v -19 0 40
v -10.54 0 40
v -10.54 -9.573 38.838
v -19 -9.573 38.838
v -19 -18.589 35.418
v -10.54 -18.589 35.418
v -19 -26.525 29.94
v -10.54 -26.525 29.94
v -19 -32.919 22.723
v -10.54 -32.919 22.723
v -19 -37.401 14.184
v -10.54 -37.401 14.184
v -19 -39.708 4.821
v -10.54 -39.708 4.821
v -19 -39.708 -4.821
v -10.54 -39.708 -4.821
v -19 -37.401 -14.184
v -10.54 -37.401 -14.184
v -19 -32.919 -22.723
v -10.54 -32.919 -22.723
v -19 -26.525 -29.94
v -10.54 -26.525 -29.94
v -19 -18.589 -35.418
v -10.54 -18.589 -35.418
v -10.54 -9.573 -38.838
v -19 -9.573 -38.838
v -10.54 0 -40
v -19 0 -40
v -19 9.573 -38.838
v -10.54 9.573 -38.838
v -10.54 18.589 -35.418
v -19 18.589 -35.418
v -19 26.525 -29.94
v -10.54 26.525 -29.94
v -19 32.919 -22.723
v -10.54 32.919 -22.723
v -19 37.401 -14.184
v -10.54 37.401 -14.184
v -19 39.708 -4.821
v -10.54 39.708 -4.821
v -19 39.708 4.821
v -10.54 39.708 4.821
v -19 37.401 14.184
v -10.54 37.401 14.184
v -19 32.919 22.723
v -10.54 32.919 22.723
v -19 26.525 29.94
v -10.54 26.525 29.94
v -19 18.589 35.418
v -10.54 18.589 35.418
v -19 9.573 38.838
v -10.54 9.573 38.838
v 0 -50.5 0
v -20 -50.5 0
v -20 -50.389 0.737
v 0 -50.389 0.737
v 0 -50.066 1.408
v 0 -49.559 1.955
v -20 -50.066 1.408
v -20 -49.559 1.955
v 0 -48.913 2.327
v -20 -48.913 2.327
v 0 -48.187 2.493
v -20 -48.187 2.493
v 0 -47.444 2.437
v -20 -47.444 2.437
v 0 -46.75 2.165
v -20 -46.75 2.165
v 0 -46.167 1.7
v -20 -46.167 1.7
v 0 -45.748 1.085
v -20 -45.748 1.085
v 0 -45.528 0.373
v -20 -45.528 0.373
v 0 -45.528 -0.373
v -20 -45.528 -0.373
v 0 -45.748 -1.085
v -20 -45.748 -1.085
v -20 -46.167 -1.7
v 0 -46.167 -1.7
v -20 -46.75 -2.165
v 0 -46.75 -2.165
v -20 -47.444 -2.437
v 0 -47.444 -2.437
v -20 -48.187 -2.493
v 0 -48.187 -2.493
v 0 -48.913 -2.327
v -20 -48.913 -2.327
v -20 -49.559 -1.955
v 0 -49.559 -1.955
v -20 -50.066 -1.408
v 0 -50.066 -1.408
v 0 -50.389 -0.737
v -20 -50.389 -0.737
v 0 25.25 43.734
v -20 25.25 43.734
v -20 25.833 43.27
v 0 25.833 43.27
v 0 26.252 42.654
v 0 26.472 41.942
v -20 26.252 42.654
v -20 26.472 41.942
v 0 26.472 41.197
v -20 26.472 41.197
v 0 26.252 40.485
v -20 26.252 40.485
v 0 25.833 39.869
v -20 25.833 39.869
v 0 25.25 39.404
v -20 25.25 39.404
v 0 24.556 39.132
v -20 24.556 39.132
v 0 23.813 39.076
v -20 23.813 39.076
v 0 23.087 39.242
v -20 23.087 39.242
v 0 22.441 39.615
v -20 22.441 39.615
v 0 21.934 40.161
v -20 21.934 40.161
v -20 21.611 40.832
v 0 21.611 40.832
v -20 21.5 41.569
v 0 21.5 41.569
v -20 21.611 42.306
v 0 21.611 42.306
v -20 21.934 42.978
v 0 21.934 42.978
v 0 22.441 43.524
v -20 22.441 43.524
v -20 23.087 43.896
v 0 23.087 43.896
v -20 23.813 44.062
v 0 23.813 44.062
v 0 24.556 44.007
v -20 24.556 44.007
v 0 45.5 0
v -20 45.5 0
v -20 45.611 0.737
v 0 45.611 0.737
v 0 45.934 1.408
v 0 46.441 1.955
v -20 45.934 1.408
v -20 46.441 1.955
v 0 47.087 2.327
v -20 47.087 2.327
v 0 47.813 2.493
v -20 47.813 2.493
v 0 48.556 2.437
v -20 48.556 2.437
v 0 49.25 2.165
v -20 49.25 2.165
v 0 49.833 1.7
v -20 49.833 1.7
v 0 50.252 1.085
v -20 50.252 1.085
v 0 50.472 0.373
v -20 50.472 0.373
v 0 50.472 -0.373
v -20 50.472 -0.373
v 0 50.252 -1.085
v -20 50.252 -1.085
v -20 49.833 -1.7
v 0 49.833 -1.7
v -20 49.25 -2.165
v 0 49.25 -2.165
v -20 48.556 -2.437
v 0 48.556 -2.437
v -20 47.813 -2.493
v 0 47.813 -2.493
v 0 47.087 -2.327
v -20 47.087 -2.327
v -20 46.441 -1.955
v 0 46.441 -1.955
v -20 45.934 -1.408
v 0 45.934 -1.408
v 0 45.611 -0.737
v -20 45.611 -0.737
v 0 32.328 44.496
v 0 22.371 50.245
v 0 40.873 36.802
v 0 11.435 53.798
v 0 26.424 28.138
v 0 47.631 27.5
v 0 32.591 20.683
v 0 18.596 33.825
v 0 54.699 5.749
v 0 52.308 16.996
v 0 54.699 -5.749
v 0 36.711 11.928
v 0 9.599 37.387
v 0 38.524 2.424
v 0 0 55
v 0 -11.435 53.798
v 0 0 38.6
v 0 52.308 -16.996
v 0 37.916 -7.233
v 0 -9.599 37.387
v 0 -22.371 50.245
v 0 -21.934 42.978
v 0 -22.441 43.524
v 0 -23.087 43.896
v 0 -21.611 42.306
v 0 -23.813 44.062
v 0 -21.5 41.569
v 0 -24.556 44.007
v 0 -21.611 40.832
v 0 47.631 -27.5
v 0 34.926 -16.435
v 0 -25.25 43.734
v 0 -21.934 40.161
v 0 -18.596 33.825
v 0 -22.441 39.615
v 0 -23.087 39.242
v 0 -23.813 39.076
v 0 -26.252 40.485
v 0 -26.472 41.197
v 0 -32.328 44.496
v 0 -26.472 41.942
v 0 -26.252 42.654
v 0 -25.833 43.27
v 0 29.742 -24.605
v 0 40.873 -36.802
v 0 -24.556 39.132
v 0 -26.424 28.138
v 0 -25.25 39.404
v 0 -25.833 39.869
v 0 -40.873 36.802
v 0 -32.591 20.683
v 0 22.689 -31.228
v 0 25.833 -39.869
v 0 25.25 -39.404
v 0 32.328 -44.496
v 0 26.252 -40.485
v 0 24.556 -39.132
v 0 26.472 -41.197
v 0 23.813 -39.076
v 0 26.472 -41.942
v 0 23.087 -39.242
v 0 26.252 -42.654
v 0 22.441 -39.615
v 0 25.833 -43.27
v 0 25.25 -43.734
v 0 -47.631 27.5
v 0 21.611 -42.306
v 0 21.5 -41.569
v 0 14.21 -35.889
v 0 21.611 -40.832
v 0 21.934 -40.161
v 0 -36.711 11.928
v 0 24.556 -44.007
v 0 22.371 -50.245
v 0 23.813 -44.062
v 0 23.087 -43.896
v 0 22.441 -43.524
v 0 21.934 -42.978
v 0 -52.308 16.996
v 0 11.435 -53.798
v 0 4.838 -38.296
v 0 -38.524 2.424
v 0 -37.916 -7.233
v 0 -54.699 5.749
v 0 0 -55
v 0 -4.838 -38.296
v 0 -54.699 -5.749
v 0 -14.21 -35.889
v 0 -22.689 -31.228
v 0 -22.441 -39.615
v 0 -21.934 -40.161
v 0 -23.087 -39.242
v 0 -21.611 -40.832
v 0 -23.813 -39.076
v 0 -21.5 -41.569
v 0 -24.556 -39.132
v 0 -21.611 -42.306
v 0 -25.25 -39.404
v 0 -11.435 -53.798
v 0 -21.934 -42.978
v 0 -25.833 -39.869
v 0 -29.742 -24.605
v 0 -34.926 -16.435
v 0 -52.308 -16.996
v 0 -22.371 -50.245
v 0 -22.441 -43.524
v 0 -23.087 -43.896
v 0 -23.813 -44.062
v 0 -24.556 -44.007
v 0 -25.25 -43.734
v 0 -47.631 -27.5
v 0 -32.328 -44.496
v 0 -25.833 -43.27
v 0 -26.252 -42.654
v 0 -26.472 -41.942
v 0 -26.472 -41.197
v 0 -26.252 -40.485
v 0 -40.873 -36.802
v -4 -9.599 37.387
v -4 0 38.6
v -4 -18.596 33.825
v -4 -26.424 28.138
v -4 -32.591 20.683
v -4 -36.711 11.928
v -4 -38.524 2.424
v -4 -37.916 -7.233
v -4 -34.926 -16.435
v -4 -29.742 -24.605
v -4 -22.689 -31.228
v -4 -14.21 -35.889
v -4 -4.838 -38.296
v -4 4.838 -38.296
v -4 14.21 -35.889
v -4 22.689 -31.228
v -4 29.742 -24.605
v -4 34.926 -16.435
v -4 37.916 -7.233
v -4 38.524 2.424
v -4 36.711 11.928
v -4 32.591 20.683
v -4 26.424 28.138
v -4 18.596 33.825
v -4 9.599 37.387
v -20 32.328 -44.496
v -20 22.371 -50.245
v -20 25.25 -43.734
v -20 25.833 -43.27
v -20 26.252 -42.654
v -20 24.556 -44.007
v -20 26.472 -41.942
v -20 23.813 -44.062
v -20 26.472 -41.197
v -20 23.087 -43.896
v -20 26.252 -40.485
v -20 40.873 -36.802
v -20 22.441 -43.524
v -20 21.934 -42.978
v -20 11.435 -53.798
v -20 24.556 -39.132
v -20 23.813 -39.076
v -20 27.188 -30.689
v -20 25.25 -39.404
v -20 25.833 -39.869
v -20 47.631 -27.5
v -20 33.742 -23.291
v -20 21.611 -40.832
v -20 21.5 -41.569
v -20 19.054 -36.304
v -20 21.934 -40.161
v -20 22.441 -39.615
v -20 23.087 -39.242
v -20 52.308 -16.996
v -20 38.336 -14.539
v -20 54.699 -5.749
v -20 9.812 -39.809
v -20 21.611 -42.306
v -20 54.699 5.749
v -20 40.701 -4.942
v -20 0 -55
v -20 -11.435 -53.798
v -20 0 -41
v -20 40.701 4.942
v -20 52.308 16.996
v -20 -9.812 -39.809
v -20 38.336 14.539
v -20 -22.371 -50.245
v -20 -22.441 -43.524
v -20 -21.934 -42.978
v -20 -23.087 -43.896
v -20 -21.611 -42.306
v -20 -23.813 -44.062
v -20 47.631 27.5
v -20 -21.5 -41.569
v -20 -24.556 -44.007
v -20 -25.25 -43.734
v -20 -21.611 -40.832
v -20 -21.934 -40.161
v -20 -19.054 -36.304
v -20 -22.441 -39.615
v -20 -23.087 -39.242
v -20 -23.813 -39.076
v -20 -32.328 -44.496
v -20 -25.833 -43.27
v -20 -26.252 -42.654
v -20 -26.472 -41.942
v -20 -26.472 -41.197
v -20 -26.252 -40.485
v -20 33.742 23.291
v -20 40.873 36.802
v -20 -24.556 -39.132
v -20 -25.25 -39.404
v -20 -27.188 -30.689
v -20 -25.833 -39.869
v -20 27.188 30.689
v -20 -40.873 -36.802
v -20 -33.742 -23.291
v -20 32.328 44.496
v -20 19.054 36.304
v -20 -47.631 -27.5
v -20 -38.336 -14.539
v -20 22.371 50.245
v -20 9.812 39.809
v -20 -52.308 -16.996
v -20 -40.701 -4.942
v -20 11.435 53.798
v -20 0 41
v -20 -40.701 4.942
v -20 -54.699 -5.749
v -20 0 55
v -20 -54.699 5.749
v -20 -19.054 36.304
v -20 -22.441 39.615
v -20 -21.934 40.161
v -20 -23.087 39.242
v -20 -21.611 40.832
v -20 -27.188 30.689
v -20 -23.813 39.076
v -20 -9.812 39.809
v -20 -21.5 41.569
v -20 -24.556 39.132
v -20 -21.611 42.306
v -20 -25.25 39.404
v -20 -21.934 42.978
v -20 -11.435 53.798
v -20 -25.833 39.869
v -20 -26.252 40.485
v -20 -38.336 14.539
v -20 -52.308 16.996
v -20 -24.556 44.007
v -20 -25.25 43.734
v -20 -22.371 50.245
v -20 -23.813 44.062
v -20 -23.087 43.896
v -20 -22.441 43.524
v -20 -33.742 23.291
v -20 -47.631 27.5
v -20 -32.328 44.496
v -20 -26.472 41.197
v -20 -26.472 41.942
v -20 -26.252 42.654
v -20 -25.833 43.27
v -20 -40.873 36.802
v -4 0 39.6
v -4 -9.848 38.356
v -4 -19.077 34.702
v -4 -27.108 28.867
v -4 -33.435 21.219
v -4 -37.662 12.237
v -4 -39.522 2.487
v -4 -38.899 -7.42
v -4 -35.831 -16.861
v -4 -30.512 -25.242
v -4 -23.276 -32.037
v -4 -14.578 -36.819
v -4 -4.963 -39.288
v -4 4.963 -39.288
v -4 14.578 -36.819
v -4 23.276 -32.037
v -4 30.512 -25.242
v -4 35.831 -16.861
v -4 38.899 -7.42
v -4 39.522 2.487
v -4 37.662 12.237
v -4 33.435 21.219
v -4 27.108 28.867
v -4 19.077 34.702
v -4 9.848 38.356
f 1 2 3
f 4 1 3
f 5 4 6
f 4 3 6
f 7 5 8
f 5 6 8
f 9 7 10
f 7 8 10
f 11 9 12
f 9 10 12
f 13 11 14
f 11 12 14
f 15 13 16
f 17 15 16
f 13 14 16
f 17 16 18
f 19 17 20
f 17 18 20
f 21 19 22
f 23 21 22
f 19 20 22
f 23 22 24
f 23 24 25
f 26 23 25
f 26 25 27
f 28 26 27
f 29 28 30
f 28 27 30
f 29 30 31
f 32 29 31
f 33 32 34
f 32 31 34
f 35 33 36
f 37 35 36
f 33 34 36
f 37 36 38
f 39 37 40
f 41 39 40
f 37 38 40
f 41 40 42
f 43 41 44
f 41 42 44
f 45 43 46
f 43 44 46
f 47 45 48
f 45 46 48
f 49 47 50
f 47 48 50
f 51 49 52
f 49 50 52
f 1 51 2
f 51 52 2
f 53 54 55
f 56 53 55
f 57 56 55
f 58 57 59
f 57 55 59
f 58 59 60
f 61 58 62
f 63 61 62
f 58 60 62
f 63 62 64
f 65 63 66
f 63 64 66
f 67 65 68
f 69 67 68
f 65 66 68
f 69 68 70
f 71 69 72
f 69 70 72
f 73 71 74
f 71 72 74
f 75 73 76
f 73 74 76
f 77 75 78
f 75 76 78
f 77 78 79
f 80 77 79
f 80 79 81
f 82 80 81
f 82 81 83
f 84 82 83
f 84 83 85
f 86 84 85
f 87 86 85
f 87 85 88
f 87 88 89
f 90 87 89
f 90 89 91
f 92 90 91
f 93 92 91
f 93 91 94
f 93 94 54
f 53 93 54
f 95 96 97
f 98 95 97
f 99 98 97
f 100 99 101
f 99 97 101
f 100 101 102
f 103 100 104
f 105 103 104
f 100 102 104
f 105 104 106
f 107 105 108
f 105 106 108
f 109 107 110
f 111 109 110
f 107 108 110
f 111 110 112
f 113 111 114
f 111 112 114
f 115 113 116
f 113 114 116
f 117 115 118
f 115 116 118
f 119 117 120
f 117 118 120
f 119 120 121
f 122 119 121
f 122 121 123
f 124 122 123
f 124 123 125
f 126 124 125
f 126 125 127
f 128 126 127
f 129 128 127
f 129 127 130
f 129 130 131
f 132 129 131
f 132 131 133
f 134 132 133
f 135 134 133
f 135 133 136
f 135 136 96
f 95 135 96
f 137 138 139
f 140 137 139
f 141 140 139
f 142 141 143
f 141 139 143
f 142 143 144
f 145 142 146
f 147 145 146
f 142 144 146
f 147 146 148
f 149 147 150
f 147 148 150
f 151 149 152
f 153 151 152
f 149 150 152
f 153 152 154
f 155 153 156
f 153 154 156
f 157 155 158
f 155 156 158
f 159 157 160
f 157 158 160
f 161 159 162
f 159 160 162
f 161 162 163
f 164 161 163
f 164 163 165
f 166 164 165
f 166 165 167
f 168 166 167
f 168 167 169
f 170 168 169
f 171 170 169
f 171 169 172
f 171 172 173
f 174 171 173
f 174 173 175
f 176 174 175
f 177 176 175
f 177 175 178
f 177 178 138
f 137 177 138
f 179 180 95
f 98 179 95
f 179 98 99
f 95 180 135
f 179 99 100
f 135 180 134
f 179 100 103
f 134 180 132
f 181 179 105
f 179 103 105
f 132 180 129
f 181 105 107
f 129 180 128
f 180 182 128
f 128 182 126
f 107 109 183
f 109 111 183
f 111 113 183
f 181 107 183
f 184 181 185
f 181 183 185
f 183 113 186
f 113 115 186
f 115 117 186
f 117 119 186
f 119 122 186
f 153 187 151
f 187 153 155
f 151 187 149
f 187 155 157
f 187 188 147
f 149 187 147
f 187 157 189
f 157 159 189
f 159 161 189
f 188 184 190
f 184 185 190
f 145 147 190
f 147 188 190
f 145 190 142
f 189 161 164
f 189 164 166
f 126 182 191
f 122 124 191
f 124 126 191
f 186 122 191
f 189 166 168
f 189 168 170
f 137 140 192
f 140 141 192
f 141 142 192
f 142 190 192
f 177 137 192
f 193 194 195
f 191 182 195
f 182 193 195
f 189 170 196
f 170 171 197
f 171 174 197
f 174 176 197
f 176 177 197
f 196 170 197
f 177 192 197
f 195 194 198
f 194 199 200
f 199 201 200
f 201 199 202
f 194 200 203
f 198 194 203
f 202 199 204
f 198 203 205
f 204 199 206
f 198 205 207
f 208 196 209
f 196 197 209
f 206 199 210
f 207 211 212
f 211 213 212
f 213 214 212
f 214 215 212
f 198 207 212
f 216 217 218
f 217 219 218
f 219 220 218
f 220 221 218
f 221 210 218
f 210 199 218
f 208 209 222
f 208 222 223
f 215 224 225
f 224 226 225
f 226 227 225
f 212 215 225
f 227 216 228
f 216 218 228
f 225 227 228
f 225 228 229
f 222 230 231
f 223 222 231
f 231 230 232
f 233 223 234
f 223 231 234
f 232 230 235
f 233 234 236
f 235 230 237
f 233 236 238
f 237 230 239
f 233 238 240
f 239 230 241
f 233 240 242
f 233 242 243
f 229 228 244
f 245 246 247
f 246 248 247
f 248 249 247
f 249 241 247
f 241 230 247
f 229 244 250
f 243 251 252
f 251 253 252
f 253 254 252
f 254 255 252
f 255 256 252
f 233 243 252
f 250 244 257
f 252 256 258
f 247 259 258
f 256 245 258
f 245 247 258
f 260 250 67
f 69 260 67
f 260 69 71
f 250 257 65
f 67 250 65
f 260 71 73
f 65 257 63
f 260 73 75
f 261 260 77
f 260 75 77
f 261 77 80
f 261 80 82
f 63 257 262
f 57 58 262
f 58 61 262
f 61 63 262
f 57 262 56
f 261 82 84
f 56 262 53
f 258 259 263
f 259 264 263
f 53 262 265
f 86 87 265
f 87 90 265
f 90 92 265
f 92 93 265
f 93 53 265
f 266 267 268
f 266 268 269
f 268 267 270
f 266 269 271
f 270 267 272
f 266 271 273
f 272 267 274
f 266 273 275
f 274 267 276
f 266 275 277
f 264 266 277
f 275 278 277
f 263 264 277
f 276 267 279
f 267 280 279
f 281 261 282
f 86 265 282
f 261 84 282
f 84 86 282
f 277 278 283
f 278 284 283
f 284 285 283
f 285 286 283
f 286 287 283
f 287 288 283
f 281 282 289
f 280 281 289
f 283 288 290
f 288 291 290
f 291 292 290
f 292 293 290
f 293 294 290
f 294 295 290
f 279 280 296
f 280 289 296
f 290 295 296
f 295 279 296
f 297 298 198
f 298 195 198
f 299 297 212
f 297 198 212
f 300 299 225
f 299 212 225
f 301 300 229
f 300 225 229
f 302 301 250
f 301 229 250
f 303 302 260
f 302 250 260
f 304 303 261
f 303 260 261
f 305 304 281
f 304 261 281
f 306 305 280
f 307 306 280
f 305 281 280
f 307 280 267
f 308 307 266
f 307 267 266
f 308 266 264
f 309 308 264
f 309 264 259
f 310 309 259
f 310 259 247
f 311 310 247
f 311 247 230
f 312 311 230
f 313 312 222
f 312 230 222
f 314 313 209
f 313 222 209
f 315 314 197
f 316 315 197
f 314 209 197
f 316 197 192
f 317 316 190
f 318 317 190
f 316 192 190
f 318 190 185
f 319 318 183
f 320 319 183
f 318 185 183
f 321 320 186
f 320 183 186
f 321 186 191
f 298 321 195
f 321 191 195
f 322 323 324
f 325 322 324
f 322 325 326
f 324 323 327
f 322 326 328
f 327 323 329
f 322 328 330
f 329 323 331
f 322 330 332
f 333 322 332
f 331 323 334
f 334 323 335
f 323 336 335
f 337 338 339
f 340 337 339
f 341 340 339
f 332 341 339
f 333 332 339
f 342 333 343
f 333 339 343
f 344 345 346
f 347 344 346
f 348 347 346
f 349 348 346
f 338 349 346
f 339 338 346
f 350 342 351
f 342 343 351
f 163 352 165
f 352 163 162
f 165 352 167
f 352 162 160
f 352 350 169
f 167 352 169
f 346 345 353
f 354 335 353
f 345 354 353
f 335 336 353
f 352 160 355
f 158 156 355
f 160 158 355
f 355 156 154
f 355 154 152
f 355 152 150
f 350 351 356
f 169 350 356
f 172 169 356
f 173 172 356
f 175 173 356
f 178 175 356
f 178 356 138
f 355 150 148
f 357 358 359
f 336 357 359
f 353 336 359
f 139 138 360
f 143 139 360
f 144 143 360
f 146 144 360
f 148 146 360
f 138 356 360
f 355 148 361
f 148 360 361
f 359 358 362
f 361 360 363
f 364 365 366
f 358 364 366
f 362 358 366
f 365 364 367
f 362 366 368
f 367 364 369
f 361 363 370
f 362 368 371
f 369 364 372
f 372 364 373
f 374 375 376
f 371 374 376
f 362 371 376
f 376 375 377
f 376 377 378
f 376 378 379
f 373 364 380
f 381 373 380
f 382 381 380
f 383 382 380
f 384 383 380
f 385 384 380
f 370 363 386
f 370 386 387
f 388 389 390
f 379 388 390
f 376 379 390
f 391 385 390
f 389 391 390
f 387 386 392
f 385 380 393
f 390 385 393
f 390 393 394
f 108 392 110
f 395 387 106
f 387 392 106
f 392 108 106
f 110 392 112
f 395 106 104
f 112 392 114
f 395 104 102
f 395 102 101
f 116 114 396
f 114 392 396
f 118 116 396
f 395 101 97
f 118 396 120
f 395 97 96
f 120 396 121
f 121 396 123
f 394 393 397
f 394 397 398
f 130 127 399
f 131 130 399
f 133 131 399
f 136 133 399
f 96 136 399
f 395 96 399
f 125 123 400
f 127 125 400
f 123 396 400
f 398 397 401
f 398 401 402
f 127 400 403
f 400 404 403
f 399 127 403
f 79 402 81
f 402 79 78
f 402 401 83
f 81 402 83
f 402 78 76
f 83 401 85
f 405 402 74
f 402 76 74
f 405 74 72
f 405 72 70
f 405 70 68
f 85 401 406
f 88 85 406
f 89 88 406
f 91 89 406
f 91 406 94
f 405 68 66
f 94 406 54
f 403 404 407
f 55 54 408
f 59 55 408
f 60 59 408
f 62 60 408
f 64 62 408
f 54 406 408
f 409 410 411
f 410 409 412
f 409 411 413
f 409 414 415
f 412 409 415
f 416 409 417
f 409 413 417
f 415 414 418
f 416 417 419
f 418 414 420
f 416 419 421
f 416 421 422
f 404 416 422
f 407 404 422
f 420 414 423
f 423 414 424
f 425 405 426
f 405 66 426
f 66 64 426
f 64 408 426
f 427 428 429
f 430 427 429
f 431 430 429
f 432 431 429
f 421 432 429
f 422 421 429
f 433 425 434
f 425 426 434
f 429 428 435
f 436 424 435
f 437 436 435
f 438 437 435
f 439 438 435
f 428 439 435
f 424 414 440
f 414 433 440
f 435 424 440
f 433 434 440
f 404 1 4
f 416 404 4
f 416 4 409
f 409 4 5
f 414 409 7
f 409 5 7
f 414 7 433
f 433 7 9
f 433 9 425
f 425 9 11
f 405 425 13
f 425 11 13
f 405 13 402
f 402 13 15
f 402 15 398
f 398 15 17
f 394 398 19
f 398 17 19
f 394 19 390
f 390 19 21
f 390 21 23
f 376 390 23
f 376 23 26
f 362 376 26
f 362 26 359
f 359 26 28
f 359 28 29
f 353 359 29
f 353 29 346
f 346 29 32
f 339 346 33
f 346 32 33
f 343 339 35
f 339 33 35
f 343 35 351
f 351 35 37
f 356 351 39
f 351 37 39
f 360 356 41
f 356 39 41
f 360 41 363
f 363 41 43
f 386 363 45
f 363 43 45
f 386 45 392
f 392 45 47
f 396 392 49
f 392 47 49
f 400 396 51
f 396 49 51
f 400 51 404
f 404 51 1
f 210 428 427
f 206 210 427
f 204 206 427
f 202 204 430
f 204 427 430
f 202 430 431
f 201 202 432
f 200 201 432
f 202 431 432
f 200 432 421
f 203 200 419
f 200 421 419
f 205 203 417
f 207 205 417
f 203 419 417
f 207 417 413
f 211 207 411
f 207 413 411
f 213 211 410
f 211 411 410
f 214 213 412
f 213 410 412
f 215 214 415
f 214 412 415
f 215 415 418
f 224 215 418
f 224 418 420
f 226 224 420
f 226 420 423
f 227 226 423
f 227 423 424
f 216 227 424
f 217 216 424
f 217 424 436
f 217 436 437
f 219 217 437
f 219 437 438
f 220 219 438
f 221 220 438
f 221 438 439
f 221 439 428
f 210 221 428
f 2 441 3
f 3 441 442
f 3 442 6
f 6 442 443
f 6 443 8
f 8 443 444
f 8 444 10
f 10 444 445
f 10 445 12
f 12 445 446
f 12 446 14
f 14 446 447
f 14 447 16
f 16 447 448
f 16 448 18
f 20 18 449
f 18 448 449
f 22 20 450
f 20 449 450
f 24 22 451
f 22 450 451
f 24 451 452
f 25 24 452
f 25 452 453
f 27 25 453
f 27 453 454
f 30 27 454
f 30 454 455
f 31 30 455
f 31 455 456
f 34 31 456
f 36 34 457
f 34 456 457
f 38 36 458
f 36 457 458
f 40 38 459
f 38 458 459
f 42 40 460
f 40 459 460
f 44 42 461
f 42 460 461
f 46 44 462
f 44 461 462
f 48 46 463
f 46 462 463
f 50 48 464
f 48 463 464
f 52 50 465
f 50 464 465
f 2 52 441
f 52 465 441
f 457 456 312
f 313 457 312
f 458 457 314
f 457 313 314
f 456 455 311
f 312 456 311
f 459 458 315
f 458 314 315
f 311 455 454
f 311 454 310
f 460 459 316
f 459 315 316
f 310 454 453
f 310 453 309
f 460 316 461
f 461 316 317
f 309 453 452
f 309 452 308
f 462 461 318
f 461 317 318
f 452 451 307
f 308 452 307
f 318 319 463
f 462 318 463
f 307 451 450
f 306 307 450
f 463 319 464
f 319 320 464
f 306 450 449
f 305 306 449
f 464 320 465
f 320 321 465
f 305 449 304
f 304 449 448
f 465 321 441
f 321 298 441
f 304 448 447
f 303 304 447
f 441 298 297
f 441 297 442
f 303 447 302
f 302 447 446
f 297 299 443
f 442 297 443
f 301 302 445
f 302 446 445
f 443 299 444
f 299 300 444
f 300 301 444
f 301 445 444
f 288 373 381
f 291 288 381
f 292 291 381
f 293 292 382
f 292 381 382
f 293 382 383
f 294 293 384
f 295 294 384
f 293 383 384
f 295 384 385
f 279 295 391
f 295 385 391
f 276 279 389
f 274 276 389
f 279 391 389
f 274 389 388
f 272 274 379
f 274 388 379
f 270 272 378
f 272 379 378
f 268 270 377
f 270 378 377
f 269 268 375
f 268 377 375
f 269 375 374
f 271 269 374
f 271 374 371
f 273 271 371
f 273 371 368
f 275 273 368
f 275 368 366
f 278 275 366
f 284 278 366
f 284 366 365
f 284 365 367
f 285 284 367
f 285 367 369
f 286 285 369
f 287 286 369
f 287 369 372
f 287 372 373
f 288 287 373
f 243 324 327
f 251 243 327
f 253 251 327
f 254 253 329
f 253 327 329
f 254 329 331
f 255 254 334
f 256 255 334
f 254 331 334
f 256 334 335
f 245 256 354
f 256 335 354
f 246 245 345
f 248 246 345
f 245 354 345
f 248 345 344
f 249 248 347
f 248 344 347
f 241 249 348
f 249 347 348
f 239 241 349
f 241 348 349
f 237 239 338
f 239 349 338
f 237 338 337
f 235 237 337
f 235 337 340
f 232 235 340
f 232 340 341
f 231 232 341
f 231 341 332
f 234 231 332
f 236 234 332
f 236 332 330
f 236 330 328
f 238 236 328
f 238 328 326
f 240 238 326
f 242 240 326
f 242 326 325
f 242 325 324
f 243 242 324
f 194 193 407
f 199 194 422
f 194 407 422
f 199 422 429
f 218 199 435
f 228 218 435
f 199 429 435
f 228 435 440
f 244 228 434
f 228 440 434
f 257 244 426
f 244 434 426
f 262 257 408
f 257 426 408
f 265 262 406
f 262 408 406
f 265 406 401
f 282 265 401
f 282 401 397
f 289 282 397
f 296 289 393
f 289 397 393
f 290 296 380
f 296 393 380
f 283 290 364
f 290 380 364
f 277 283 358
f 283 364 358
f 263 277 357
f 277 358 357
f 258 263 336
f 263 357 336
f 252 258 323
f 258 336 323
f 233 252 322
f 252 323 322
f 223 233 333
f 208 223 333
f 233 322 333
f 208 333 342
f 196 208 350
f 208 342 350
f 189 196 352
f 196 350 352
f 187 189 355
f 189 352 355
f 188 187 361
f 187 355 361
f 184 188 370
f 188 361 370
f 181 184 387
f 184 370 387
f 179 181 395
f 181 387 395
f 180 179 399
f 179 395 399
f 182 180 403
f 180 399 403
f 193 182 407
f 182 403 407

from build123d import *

# Parameters (mm, degrees)
F2_SIZE          = 1
F3_R             = 2.5
F4_DEPTH         = 20.001
F4_COPIES_COUNT  = 3
F4_COPIES_ANGLE  = 120
F4_COPIES1_COUNT = 3
F4_COPIES1_ANGLE = 120
F5_R             = 2.5
F6_DEPTH         = 20.001


# Not quite as in the source:
# - a pattern or mirror of a feature is missing from the dataset's text; its kind, count and spacing are read off the source's solid


with BuildPart() as f1:
    # F0 (on Front) → F1 (revolve)
    with BuildSketch(Plane.XZ):
        Polygon((-4, 38.6), (0, 38.6), (0, 55), (-20, 55), (-20, 40), (-10.5399421904, 40), (-4, 39.6), align=None)
    revolve(axis=Axis((12.3917190358, 0, 0), (1, 0, 0)))

    # F2
    f2_edges = [f1.edges().sort_by_distance(p)[0] for p in [
        (-20, 0, -40),
    ]]
    chamfer(f2_edges, length=F2_SIZE)

    # F3 (on face) → F4 (cut, through all)
    with BuildSketch(Plane(origin=(-20, 0, 0), x_dir=(0, -1, 0), z_dir=(-1, 0, 0))):
        with Locations((48, 0)):
            Circle(F3_R)
    f4 = extrude(amount=-F4_DEPTH, mode=Mode.SUBTRACT)

    # F4_copies: F4 ×3 about axis
    f4_copies_axis = Axis((0, 0, 0), (1, 0, 0))
    for i in range(1, F4_COPIES_COUNT):
        add(f4.rotate(f4_copies_axis, i * F4_COPIES_ANGLE / (F4_COPIES_COUNT - 1)), mode=Mode.SUBTRACT)

    # F4_copies1: F4 ×3 about axis
    f4_copies1_axis = Axis((0, 0, 0), (-1, 0, 0))
    for i in range(1, F4_COPIES1_COUNT):
        add(f4.rotate(f4_copies1_axis, i * F4_COPIES1_ANGLE / (F4_COPIES1_COUNT - 1)), mode=Mode.SUBTRACT)

    # F5 (on face) → F6 (cut, through all)
    with BuildSketch(Plane(origin=(-20, 0, 0), x_dir=(0, -1, 0), z_dir=(-1, 0, 0))):
        with Locations((-48, 0)):
            Circle(F5_R)
    extrude(amount=-F6_DEPTH, mode=Mode.SUBTRACT)


solid = f1.part
